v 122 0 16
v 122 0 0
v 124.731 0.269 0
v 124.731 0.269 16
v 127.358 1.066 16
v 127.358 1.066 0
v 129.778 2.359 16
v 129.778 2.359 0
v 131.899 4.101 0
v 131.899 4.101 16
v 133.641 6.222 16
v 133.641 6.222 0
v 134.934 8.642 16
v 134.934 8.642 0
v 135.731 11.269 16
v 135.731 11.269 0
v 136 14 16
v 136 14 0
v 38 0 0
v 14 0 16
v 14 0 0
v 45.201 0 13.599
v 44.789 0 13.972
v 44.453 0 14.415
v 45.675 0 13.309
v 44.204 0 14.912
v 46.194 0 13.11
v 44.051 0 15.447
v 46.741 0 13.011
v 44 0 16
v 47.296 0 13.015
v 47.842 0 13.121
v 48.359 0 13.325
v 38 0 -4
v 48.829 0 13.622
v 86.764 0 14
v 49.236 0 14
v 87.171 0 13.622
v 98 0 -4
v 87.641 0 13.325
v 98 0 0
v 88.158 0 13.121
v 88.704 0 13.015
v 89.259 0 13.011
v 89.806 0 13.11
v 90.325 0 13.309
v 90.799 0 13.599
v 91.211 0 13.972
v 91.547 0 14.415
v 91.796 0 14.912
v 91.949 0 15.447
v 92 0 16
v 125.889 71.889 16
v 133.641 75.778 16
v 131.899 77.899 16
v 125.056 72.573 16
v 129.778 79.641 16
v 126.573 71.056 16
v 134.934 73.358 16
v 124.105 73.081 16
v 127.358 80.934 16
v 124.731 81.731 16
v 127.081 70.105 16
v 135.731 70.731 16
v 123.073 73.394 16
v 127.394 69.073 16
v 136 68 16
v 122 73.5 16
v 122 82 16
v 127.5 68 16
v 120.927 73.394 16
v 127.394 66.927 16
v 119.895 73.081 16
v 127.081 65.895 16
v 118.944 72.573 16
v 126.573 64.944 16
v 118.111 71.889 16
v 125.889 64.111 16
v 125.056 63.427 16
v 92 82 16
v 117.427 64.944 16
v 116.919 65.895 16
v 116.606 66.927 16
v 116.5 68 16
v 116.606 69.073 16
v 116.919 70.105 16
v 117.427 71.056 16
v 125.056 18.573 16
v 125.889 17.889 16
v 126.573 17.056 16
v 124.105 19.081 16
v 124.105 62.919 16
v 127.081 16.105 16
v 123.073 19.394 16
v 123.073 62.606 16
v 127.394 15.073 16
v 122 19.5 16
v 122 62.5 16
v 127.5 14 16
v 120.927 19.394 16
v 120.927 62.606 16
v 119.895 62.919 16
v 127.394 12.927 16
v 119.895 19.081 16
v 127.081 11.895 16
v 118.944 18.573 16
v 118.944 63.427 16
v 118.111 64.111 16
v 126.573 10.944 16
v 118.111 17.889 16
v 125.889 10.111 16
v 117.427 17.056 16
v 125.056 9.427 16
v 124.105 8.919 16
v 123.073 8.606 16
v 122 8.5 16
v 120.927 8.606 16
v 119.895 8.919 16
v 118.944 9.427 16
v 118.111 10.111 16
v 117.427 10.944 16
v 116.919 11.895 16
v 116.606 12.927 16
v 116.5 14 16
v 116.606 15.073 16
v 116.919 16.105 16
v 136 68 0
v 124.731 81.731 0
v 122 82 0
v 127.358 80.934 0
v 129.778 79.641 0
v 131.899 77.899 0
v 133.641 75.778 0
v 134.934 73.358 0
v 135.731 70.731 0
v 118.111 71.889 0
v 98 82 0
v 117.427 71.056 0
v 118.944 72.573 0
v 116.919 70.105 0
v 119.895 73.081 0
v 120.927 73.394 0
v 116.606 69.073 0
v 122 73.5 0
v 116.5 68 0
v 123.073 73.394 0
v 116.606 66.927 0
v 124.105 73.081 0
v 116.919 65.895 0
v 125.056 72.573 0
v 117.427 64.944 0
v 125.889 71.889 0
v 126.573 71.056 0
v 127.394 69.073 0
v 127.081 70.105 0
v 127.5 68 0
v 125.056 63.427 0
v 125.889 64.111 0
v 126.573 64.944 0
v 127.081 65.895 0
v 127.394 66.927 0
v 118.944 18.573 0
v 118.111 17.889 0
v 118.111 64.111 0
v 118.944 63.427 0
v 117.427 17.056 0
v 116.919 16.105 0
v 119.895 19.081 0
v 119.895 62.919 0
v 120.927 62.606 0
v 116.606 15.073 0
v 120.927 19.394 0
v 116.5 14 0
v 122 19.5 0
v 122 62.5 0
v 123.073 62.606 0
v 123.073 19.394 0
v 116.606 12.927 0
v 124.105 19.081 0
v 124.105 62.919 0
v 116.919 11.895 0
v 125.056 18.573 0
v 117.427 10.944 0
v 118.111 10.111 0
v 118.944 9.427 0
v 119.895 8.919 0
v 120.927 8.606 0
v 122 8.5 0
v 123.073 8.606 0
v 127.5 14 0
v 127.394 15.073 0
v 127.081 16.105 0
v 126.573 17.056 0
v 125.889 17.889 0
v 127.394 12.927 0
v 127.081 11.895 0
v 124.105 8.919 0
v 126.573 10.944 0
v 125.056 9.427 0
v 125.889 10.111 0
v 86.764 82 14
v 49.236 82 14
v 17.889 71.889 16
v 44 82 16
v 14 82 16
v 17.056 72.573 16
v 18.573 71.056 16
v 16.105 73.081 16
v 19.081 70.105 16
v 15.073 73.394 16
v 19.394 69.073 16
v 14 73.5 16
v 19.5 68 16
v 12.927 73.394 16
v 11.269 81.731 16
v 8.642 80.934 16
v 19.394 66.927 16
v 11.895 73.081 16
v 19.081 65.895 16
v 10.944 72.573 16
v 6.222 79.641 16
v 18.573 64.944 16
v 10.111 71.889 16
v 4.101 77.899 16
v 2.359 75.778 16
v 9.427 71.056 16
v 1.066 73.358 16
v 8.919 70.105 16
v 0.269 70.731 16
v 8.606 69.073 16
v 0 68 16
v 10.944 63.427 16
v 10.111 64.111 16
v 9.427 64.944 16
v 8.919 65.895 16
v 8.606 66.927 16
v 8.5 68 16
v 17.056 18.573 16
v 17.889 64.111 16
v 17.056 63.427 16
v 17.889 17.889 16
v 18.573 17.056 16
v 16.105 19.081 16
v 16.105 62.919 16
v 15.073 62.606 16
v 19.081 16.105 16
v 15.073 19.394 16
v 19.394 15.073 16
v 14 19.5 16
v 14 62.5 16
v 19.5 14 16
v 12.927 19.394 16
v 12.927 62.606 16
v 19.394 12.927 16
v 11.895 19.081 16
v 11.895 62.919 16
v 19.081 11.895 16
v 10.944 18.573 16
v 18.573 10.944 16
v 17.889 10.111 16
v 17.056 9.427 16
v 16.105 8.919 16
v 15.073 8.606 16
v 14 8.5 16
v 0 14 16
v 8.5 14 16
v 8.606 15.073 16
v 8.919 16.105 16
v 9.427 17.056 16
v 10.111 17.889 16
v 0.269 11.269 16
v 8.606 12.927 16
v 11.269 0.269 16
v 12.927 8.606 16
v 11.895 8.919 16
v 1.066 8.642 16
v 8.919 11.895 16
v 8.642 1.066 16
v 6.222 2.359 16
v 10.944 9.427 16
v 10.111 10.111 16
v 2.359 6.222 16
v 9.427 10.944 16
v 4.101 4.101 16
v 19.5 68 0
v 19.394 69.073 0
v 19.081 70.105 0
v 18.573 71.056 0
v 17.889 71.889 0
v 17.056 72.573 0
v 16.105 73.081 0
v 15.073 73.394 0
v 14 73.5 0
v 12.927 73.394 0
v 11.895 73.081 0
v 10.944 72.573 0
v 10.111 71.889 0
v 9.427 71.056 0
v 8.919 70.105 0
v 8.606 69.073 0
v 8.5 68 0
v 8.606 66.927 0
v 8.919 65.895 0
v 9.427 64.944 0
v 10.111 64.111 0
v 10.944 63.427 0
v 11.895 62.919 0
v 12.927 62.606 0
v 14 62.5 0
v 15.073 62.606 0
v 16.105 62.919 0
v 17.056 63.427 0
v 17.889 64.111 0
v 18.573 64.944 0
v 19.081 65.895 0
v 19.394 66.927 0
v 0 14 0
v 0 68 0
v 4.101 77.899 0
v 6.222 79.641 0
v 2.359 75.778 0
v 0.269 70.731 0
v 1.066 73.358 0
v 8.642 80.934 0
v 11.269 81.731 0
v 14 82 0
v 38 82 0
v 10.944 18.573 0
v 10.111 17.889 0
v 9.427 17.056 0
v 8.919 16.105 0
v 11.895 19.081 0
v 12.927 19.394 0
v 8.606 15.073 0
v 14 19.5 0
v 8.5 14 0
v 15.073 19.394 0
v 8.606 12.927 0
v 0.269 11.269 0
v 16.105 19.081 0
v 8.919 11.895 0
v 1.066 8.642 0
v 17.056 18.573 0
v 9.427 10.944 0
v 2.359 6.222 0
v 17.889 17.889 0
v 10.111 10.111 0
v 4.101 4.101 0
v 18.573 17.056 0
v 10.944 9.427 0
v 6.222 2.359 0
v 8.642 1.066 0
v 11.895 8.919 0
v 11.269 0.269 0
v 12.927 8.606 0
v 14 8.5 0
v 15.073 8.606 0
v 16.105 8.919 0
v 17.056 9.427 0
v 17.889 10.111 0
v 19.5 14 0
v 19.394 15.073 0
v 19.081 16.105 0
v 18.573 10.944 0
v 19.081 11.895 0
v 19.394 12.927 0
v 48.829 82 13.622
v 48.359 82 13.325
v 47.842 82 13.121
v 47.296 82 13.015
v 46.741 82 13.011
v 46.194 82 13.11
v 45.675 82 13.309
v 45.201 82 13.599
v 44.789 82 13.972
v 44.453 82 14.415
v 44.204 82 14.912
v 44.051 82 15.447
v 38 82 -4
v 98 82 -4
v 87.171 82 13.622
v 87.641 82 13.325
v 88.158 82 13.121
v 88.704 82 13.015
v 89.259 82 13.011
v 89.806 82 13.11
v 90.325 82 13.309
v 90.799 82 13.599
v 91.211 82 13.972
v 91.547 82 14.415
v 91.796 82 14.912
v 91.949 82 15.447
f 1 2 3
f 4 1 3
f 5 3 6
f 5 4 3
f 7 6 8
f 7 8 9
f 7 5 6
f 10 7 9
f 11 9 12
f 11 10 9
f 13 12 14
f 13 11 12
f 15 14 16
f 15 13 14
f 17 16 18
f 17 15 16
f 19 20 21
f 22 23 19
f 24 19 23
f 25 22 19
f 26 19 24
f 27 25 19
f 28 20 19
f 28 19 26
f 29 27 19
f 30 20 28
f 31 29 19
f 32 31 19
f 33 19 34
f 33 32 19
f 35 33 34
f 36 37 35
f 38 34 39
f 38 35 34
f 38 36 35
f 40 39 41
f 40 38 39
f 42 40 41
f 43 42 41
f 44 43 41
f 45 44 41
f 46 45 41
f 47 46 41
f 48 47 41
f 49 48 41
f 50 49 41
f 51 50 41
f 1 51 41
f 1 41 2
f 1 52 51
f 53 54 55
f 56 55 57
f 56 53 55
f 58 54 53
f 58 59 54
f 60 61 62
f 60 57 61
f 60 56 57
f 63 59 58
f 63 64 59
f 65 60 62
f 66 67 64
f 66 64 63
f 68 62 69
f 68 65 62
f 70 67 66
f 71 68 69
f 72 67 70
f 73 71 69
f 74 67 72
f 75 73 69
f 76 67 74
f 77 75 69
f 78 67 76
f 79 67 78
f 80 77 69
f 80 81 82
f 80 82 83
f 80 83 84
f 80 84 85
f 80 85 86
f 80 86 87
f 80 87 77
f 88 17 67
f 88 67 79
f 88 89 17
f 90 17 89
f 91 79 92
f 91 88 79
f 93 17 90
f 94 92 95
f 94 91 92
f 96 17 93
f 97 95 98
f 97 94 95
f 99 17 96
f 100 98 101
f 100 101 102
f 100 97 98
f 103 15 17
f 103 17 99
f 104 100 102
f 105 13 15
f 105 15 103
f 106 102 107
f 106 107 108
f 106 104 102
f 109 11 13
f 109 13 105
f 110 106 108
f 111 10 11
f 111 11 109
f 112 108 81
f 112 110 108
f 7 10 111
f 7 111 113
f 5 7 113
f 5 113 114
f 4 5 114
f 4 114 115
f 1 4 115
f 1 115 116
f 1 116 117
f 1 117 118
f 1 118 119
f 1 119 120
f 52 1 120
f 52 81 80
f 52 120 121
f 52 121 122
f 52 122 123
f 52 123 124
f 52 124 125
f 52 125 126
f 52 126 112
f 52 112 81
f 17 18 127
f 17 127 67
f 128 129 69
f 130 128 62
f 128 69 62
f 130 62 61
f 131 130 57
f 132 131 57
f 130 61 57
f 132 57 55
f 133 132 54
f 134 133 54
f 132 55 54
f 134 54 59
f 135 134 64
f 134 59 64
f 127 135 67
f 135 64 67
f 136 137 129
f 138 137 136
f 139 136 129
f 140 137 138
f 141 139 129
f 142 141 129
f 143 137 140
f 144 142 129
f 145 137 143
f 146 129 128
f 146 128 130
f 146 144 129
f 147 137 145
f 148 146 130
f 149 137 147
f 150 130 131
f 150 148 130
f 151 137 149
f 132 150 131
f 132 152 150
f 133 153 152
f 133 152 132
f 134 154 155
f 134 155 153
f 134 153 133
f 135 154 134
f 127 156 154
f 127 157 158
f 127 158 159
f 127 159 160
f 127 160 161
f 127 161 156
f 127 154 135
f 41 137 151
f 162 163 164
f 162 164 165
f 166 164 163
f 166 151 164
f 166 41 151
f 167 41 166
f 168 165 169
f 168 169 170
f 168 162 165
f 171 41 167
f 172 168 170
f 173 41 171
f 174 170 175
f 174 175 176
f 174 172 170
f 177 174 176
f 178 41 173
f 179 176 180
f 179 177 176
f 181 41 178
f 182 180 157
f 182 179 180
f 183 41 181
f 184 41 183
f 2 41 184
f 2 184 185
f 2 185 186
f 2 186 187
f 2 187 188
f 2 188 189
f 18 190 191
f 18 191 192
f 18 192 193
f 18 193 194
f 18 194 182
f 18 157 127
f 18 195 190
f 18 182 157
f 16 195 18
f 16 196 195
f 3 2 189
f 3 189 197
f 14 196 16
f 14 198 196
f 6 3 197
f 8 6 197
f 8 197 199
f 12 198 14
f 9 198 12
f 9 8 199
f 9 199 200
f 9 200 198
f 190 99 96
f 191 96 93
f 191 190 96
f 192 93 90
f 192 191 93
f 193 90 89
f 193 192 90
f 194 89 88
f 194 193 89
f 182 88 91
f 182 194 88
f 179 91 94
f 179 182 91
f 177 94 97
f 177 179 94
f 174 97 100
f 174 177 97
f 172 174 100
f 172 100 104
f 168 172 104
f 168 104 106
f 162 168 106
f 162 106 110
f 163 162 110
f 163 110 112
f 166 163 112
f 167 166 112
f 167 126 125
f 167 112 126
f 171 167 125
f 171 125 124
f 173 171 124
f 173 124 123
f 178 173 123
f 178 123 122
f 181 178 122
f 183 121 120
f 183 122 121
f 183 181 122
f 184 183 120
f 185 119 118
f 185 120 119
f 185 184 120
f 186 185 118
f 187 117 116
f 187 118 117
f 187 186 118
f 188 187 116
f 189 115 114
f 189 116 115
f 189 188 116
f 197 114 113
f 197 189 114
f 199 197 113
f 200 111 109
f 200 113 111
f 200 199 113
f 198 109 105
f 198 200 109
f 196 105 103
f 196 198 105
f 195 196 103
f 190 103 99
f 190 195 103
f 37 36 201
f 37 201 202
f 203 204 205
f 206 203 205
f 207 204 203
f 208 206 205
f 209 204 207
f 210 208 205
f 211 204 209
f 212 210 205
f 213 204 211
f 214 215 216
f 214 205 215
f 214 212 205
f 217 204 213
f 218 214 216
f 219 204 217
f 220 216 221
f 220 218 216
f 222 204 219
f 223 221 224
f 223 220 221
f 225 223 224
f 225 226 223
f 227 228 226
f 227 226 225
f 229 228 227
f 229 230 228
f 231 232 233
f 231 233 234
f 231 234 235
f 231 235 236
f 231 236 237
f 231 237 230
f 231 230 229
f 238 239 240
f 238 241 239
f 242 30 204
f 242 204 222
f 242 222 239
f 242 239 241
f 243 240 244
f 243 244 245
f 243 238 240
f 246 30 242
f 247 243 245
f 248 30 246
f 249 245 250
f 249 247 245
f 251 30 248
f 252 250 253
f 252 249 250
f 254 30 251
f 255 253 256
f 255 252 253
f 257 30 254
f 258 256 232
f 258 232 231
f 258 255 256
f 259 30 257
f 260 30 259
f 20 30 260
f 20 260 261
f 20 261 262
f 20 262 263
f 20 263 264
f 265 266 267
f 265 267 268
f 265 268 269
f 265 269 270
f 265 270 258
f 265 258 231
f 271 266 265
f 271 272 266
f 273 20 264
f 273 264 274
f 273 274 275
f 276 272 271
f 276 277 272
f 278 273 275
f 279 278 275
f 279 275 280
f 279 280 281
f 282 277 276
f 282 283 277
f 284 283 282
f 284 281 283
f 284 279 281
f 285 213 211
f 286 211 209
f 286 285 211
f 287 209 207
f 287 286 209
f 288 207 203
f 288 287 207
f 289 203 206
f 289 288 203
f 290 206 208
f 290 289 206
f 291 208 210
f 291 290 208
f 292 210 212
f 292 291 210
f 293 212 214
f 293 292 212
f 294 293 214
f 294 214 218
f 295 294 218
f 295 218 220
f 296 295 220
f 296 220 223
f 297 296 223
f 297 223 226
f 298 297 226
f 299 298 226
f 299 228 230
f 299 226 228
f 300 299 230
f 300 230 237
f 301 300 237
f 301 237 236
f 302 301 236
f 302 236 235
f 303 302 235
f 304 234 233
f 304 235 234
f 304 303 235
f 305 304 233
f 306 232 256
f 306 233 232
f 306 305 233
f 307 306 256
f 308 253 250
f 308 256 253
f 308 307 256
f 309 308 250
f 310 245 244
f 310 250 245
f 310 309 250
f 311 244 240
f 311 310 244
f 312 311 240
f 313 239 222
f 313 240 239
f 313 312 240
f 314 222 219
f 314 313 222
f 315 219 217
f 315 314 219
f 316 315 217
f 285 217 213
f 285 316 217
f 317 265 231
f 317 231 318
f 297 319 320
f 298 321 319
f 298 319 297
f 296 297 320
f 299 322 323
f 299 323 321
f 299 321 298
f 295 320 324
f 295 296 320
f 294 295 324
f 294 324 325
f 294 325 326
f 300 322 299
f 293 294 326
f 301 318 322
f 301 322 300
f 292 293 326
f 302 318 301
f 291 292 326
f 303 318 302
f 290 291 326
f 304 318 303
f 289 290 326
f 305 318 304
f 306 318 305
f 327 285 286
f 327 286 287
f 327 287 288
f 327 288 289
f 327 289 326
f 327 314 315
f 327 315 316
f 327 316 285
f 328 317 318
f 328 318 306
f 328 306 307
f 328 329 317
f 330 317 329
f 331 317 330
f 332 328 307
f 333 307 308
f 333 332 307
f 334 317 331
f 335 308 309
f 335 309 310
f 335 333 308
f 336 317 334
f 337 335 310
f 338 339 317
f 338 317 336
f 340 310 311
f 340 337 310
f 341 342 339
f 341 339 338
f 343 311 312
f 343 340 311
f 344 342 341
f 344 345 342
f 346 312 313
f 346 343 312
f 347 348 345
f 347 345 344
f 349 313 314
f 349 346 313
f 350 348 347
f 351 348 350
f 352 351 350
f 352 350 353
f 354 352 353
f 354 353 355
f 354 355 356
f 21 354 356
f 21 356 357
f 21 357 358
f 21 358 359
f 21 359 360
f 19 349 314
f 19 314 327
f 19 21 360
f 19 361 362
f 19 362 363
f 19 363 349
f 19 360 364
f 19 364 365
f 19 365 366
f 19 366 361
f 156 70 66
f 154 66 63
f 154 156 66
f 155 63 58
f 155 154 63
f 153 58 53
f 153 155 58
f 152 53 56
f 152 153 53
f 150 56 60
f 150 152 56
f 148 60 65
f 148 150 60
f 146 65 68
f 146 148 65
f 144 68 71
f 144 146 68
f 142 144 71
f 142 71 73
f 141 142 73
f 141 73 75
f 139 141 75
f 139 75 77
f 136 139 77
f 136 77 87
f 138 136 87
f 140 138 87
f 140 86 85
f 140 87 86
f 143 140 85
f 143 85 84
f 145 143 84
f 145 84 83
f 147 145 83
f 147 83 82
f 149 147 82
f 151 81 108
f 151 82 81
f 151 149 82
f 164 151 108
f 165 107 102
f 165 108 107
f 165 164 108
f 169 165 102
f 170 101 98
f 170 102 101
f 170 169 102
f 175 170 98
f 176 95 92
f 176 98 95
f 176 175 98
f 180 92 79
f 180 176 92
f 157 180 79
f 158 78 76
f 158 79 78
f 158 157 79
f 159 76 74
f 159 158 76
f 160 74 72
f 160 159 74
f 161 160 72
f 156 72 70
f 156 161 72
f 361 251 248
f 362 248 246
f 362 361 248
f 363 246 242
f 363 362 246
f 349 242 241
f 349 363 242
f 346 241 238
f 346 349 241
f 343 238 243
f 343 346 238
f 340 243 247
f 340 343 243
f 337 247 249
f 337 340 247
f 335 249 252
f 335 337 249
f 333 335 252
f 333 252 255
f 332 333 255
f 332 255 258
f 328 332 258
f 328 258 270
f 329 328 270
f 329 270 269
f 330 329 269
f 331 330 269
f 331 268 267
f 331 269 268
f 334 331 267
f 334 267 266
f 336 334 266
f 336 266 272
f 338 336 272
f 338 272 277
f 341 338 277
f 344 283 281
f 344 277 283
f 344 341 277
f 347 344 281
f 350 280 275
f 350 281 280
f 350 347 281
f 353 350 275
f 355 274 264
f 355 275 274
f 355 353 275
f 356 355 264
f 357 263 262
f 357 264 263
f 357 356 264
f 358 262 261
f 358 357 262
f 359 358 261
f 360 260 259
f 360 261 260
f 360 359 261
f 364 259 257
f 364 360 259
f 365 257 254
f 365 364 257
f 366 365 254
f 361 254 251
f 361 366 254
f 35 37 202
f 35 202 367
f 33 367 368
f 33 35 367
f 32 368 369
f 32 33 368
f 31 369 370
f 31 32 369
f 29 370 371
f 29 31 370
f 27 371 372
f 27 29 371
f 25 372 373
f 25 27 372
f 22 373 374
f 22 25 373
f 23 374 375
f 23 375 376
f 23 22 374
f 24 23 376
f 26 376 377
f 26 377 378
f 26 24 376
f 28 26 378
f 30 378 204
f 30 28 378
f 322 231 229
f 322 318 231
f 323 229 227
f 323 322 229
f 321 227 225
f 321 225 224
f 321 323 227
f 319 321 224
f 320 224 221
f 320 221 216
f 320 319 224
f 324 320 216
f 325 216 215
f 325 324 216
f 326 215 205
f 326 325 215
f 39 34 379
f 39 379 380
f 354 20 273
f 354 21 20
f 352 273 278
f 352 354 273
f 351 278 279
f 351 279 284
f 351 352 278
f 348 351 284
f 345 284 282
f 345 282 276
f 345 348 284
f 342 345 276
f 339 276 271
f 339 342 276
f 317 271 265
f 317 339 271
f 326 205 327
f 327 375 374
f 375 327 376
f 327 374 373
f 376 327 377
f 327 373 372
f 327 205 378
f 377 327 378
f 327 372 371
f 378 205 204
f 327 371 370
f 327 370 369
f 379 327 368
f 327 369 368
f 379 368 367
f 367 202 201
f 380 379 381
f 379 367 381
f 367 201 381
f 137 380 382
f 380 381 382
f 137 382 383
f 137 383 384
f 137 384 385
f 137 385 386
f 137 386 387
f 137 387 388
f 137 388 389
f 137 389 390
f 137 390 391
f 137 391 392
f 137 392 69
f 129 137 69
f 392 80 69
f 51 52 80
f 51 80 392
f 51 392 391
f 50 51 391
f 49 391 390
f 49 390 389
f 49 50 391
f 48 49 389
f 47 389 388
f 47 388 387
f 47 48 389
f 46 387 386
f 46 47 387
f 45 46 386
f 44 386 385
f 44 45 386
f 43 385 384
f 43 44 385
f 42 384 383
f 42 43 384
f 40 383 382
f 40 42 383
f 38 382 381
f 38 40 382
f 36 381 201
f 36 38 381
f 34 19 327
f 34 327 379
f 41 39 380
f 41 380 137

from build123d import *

# Parameters (mm, degrees)
F1_DEPTH = 82
F2_R     = 5.5
F3_DEPTH = 16.001
F4_R     = 14
F5_R     = 14


with BuildPart() as f1:
    # F0 (on Front) → F1 (new body)
    with BuildSketch(Plane.XZ):
        with BuildLine():
            Line((0, 16), (0, 0))
            Line((0, 0), (38, 0))
            Line((38, 0), (38, -4))
            Line((38, -4), (98, -4))
            Line((98, -4), (98, 0))
            Line((98, 0), (136, 0))
            Line((136, 0), (136, 16))
            Line((136, 16), (92, 16))
            ThreePointArc((92, 16), (90.070466, 13.197483), (86.763932, 14))
            Line((86.763932, 14), (49.236068, 14))
            ThreePointArc((49.236068, 14), (45.929534, 13.197483), (44, 16))
            Line((44, 16), (0, 16))
        make_face()
    extrude(amount=-F1_DEPTH)

    # F2 (on Top) → F3 (cut, through all)
    with BuildSketch(Plane.XY):
        with Locations((14, 68)):
            Circle(F2_R)
        with Locations((14, 14)):
            Circle(F2_R)
        with Locations((122, 68)):
            Circle(F2_R)
        with Locations((122, 14)):
            Circle(F2_R)
    extrude(amount=F3_DEPTH, mode=Mode.SUBTRACT)

    # F4
    f4_edges = [f1.edges().sort_by_distance(p)[0] for p in [
        (136, 0, 8),
        (136, 82, 8),
    ]]
    fillet(f4_edges, radius=F4_R)

    # F5
    f5_edges = [f1.edges().sort_by_distance(p)[0] for p in [
        (0, 0, 8),
        (0, 82, 8),
    ]]
    fillet(f5_edges, radius=F5_R)


solid = f1.part
